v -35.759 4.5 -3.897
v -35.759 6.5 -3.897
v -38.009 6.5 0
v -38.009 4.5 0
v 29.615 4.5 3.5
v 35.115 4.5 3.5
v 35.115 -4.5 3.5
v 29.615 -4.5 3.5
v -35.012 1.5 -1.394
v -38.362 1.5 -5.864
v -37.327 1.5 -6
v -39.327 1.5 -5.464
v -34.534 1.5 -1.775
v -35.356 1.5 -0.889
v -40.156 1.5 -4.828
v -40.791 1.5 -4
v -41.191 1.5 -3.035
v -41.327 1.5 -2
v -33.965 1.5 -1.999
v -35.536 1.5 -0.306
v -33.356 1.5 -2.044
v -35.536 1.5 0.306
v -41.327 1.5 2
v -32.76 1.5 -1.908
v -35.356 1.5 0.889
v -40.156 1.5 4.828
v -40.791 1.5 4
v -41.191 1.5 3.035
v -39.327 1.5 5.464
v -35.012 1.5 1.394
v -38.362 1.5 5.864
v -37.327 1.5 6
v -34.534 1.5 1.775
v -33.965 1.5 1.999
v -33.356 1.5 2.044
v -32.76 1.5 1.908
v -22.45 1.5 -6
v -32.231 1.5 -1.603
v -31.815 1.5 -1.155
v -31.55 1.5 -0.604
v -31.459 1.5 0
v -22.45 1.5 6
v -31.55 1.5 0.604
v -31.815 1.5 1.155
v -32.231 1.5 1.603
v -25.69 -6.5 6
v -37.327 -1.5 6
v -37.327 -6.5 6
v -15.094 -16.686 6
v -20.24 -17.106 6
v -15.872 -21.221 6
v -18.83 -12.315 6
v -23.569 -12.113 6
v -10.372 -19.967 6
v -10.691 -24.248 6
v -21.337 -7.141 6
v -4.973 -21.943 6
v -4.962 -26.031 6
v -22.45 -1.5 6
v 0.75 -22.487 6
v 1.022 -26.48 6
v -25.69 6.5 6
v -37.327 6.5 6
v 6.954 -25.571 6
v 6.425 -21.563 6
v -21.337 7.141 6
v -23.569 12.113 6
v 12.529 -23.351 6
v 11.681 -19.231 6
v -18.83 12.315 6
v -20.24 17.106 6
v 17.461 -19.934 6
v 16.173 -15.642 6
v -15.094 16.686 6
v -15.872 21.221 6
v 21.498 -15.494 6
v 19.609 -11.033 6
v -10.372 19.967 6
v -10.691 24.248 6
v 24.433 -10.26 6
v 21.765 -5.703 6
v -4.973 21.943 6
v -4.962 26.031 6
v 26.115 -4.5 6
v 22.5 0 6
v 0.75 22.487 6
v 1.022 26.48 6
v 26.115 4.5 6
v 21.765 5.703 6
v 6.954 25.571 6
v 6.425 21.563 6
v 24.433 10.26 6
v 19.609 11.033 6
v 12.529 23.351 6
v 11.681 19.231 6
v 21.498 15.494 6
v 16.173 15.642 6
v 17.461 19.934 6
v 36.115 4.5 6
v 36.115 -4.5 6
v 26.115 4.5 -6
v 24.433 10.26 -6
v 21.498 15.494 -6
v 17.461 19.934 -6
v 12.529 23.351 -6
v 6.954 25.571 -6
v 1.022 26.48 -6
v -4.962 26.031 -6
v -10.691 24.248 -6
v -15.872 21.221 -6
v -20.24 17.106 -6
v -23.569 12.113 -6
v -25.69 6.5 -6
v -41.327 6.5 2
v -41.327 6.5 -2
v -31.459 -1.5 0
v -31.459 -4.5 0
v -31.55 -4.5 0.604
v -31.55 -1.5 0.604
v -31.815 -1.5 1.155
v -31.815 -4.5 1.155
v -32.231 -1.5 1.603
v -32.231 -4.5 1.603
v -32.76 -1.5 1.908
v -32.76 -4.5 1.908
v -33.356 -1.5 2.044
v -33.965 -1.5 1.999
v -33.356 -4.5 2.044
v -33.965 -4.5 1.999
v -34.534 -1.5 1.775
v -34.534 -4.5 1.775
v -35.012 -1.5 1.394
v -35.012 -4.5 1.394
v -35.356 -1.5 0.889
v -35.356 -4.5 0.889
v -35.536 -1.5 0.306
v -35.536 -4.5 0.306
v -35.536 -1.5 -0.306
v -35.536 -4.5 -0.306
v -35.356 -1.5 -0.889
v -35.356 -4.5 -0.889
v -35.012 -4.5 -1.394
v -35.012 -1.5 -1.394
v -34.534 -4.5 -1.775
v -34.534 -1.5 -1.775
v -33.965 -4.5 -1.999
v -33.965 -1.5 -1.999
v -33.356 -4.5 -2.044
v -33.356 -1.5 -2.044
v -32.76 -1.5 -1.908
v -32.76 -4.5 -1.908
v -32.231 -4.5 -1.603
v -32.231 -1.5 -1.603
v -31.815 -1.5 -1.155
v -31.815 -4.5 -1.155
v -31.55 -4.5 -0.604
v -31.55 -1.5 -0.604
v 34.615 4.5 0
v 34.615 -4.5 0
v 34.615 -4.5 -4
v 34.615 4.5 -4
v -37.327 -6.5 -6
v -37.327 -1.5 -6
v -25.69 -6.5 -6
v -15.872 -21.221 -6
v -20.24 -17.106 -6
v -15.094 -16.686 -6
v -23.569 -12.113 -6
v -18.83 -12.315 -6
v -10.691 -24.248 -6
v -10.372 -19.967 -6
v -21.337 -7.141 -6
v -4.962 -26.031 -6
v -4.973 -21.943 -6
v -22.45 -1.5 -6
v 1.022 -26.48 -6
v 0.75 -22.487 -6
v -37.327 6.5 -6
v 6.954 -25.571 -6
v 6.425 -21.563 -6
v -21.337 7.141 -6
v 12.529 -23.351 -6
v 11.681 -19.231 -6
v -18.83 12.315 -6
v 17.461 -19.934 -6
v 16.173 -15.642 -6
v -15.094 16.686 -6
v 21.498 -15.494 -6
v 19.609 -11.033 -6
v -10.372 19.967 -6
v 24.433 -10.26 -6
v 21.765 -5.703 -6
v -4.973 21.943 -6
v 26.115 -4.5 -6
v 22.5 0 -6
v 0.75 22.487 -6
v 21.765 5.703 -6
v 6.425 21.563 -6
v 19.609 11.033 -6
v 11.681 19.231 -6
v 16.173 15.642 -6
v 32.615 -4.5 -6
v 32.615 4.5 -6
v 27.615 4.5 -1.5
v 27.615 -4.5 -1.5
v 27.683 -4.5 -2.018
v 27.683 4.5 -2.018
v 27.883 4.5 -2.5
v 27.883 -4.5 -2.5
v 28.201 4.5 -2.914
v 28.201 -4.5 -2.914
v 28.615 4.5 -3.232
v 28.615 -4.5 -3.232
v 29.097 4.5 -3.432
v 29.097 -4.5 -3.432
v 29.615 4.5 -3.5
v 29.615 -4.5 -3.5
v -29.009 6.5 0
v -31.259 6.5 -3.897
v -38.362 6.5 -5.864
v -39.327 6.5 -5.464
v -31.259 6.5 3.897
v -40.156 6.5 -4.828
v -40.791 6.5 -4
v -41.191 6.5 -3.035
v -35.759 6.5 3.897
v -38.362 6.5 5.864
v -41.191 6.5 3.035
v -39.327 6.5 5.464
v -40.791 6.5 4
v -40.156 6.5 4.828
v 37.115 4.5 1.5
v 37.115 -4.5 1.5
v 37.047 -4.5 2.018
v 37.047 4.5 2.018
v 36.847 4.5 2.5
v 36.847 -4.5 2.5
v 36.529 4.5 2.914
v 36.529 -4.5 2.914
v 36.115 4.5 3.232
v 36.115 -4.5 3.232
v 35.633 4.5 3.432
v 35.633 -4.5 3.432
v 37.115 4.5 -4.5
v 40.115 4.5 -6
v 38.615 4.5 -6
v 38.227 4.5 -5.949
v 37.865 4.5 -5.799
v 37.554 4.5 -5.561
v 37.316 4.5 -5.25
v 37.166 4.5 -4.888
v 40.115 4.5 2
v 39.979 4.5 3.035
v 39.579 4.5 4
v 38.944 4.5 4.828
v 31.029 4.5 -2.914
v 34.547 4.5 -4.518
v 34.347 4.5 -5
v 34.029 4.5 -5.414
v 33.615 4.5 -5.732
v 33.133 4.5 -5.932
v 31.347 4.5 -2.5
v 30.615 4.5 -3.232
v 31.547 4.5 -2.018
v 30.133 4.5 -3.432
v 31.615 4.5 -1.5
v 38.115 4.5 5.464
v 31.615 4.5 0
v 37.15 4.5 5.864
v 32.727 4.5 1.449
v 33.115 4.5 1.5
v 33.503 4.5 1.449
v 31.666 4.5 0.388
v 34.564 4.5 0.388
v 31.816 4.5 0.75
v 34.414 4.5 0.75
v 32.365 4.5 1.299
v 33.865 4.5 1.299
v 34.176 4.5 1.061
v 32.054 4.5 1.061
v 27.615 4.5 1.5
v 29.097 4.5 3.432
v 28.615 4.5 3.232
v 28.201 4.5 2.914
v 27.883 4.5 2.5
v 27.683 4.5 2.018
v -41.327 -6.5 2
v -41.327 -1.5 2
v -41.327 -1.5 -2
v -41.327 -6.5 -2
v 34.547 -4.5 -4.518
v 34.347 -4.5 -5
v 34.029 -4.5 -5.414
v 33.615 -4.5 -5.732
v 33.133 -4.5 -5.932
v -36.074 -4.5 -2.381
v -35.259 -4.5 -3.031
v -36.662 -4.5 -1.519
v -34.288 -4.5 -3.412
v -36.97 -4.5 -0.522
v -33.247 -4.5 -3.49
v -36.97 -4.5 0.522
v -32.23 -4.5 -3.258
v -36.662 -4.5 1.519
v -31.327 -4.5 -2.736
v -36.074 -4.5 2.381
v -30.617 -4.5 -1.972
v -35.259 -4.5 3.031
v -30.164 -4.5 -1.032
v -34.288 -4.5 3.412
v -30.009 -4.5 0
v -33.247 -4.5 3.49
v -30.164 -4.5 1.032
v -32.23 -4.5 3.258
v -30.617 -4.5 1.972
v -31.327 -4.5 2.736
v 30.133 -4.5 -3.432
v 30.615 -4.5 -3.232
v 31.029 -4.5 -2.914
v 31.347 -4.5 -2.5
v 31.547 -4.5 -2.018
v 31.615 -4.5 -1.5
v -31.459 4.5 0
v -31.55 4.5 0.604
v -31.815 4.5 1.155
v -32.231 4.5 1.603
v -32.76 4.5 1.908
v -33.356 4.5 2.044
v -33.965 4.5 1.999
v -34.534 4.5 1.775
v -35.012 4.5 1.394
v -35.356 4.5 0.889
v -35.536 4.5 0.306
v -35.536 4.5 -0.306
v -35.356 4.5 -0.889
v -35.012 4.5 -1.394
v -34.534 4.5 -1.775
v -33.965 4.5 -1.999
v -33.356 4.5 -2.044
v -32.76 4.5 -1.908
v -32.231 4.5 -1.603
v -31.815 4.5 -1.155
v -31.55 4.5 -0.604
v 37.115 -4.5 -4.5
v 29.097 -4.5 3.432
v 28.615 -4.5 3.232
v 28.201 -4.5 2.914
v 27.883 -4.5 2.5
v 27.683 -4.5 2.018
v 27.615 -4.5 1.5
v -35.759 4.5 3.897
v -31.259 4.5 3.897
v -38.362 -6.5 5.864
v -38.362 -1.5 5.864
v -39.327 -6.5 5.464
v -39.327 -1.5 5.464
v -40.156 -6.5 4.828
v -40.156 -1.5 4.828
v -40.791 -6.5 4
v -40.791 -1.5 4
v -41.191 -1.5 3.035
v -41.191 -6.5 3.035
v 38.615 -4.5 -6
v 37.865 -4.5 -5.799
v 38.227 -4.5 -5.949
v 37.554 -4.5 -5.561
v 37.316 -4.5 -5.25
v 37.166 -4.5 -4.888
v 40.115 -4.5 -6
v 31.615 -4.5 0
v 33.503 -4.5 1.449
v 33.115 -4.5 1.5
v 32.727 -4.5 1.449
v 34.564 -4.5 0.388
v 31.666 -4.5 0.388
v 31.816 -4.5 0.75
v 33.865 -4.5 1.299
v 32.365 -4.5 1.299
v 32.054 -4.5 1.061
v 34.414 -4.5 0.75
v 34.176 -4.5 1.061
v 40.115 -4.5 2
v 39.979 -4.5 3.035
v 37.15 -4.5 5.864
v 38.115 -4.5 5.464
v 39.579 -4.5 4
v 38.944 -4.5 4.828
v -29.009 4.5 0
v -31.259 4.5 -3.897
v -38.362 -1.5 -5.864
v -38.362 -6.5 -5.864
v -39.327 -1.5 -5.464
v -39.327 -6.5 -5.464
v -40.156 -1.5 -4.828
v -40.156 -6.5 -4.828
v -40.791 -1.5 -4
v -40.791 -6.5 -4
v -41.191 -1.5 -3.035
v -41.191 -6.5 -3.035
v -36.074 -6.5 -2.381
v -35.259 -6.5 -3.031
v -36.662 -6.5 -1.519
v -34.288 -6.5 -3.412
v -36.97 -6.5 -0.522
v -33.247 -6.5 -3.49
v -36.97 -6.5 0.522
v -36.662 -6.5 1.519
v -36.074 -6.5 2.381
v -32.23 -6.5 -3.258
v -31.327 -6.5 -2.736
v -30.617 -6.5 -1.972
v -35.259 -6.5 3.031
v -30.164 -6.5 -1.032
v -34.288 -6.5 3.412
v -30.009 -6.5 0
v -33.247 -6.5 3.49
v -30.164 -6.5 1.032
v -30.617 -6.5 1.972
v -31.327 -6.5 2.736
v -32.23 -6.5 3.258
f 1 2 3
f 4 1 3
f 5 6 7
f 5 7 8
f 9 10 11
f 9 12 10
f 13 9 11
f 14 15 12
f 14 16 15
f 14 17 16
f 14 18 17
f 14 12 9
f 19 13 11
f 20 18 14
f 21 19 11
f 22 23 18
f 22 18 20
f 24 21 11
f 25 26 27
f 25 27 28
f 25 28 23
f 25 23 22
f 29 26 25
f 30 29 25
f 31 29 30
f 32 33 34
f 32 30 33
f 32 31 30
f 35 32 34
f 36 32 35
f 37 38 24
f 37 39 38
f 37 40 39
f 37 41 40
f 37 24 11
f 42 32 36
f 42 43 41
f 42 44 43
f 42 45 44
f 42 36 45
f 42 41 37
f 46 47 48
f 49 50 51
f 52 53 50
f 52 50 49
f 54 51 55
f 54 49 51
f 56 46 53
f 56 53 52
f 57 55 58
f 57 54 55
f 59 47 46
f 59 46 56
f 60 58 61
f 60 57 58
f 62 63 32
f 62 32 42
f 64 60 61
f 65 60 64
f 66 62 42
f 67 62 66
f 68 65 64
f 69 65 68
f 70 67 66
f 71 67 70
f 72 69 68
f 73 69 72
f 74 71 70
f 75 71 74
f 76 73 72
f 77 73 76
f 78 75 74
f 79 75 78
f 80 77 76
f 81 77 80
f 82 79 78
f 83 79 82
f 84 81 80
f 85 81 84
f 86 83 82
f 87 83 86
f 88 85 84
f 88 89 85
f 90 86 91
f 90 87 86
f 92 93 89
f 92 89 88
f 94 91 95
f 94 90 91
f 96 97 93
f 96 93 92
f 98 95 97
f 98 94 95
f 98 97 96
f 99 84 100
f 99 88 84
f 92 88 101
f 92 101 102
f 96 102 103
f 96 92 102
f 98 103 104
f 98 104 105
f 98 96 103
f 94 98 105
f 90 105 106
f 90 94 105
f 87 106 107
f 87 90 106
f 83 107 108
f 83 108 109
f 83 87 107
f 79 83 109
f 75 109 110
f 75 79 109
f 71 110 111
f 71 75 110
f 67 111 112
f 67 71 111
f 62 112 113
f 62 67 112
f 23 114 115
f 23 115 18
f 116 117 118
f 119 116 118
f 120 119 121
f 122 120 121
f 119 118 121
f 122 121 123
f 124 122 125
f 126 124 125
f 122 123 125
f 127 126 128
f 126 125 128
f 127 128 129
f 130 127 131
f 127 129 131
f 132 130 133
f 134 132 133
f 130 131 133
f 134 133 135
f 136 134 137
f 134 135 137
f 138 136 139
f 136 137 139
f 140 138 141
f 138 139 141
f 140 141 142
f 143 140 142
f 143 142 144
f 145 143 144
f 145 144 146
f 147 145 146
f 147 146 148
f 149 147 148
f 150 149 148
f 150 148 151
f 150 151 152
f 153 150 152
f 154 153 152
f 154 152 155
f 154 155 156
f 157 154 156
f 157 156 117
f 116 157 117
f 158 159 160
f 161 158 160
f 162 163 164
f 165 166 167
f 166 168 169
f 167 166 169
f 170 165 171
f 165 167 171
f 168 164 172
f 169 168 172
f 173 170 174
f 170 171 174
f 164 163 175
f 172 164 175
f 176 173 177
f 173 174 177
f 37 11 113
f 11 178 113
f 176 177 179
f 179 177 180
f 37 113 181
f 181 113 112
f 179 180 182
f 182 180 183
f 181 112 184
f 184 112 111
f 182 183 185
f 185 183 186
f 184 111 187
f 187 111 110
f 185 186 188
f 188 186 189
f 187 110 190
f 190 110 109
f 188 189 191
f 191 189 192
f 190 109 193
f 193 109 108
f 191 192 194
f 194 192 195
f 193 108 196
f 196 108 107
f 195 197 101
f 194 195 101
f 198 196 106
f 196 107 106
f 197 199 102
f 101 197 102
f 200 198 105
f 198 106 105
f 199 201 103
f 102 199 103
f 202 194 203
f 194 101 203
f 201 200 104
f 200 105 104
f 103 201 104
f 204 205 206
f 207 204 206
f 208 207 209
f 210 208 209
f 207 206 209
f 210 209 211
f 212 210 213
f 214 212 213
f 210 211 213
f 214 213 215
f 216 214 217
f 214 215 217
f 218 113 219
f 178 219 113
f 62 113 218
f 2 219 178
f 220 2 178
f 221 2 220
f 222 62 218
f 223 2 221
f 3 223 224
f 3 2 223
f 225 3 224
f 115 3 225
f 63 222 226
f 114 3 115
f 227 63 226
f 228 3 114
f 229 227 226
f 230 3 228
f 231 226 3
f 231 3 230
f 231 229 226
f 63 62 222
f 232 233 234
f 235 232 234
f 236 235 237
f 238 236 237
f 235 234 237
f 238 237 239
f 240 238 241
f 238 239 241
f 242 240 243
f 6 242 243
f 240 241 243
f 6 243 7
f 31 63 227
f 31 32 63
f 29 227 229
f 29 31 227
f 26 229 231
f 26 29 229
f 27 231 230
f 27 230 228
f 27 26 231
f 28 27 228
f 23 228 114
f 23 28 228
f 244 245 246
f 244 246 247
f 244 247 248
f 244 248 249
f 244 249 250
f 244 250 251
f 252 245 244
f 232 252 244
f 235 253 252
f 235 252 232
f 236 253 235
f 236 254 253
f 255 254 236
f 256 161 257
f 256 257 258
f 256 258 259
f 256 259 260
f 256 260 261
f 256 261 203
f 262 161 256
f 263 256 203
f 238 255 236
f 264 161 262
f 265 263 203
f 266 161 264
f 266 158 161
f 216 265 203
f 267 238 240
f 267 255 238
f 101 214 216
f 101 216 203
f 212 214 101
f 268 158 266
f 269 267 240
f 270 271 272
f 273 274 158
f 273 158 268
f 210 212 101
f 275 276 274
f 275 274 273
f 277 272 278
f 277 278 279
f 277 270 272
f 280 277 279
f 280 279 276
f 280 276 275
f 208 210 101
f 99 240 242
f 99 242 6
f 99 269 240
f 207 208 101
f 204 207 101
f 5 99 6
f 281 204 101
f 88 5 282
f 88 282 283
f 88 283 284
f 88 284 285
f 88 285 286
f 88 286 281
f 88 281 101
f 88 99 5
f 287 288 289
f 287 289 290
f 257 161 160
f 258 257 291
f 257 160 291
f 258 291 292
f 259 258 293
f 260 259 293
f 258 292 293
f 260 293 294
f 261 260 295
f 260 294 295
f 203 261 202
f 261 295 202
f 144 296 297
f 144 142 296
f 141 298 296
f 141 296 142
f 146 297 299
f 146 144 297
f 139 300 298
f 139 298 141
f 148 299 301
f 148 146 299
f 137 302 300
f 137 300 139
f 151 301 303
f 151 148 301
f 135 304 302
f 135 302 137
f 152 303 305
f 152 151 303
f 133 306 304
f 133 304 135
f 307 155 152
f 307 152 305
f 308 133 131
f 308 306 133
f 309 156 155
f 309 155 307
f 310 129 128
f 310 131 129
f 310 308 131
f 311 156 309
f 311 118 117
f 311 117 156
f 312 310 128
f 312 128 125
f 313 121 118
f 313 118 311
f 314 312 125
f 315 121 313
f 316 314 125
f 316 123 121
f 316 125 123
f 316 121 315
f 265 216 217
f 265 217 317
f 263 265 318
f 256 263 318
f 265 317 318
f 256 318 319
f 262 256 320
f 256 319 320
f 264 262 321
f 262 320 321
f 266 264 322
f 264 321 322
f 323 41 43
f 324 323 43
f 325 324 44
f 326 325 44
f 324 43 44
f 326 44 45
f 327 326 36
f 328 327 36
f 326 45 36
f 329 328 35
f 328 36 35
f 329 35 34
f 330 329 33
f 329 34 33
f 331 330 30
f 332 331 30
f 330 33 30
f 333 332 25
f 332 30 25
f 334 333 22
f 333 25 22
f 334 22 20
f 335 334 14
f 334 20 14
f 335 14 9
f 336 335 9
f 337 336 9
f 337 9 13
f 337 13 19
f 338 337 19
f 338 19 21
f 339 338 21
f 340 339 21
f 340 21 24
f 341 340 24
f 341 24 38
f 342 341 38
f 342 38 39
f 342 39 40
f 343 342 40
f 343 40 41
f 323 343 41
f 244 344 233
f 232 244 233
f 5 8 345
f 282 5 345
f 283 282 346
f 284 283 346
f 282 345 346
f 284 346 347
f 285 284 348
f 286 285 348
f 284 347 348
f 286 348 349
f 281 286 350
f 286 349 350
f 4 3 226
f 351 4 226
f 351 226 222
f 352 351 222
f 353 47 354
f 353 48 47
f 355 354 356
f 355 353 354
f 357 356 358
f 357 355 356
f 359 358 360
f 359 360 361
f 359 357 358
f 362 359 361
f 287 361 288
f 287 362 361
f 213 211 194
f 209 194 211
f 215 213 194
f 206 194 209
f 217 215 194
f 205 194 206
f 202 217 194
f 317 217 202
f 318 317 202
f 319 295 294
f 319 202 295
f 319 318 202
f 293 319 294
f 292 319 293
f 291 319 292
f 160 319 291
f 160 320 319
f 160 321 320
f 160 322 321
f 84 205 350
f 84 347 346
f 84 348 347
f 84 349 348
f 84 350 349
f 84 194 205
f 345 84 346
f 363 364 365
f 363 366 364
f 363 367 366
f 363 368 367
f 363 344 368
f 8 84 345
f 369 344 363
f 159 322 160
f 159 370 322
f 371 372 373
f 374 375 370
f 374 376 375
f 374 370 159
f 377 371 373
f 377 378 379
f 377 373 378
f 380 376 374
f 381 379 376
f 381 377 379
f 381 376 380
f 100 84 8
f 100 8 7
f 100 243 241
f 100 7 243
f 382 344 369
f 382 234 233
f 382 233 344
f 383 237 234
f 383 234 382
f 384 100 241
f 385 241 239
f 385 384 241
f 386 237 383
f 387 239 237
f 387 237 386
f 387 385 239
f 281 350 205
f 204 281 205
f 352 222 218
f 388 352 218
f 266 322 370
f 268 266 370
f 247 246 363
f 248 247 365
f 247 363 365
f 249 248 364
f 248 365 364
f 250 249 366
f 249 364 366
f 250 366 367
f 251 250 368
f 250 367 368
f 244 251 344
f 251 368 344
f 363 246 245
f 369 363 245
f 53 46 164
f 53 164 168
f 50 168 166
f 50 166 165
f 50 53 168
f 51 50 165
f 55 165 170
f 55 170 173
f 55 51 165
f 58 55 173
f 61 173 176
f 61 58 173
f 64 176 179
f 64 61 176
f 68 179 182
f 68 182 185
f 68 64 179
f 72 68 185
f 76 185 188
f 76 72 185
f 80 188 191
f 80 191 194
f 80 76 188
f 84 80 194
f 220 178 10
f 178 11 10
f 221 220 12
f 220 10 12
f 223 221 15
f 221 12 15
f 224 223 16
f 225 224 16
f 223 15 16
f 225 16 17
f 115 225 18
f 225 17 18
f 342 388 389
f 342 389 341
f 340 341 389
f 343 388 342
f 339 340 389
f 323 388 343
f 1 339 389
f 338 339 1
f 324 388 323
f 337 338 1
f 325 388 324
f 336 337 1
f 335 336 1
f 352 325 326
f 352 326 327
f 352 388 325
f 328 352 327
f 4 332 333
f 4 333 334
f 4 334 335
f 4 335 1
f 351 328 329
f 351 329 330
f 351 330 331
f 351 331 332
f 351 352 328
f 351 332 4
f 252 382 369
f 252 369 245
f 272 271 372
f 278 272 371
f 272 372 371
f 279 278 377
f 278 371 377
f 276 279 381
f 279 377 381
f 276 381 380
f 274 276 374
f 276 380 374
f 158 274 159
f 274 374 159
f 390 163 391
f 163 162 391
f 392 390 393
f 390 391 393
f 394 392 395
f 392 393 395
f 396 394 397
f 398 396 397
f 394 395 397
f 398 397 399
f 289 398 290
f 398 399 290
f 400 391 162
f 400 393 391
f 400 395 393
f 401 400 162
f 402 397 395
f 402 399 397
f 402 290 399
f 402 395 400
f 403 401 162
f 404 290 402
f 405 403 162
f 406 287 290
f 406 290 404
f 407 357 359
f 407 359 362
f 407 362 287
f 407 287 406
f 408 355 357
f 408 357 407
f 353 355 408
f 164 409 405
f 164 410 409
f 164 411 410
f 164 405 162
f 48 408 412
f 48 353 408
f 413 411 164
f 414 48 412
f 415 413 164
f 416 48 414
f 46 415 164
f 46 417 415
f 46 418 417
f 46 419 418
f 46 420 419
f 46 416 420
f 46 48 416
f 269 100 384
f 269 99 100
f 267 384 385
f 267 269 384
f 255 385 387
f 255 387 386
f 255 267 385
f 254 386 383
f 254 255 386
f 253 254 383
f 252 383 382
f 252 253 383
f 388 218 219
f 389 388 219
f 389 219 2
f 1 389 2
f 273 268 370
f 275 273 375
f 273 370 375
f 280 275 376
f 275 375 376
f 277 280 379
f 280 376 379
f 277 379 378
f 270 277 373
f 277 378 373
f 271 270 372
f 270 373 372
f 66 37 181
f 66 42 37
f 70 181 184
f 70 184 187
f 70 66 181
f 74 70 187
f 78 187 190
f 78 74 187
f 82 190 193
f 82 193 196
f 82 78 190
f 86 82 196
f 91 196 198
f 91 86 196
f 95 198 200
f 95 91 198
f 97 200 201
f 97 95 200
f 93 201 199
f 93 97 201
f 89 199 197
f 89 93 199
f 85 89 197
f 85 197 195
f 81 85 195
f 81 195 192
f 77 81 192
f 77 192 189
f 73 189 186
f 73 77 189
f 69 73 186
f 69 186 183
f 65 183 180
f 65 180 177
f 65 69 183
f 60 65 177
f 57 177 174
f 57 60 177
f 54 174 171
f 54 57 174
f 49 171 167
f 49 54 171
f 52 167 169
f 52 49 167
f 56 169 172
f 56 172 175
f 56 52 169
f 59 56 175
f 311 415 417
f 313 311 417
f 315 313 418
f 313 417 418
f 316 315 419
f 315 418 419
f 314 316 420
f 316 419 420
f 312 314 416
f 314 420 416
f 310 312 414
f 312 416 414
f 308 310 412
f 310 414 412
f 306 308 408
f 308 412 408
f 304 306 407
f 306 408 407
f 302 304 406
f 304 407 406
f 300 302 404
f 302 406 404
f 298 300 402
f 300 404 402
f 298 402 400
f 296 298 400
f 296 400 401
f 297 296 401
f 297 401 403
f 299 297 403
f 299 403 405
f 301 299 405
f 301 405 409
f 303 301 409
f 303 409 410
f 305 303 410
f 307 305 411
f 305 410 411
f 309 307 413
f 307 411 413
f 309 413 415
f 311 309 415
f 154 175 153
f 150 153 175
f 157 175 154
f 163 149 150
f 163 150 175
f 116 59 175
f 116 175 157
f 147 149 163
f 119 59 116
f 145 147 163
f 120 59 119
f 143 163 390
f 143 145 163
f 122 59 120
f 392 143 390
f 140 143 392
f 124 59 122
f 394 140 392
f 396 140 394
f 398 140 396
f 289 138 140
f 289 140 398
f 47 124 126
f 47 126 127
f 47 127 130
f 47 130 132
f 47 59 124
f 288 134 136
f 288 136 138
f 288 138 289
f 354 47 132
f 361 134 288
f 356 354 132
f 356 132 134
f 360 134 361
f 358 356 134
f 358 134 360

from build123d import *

# Parameters (mm, degrees)
F1_DEPTH = 6
F5_DEPTH = 9
F2_R     = 2.05
F6_DEPTH = 13
F2_R_2   = 3.5
F7_DEPTH = 2
F8_DEPTH = 2
F9_R     = 4


with BuildPart() as f1:
    # F0 (on Top) → F1 (new body, symmetric)
    with BuildSketch(Plane.XY):
        with BuildLine():
            ThreePointArc((-22.449944, 1.5), (22.5, 0), (-22.449944, -1.5))
            Line((-22.449944, -1.5), (-41.327112, -1.5))
            Line((-41.327112, -1.5), (-41.327112, -6.5))
            Line((-41.327112, -6.5), (-25.690465, -6.5))
            ThreePointArc((-25.690465, -6.5), (1.022294, -26.480274), (26.11513, -4.5))
            Line((26.11513, -4.5), (40.11513, -4.5))
            Line((40.11513, -4.5), (40.11513, 4.5))
            Line((40.11513, 4.5), (26.11513, 4.5))
            ThreePointArc((26.11513, 4.5), (1.022294, 26.480274), (-25.690465, 6.5))
            Line((-25.690465, 6.5), (-41.327112, 6.5))
            Line((-41.327112, 6.5), (-41.327112, 1.5))
            Line((-41.327112, 1.5), (-22.449944, 1.5))
        make_face()
    extrude(amount=F1_DEPTH, both=True)

    # F4 (on face) → F5 (cut, through all)
    with BuildSketch(Plane.XZ.offset(4.5)):
        with BuildLine():
            ThreePointArc((38.61513, -6), (37.55447, -5.56066), (37.11513, -4.5))
            Line((37.11513, -4.5), (37.11513, 1.5))
            ThreePointArc((37.11513, 1.5), (36.529343, 2.914214), (35.11513, 3.5))
            Line((35.11513, 3.5), (29.61513, 3.5))
            ThreePointArc((29.61513, 3.5), (28.200916, 2.914214), (27.61513, 1.5))
            Line((27.61513, 1.5), (27.61513, -1.5))
            ThreePointArc((27.61513, -1.5), (28.200916, -2.914214), (29.61513, -3.5))
            ThreePointArc((29.61513, -3.5), (31.029343, -2.914214), (31.61513, -1.5))
            Line((31.61513, -1.5), (31.61513, 0))
            ThreePointArc((31.61513, 0), (32.05447, 1.06066), (33.11513, 1.5))
            ThreePointArc((33.11513, 1.5), (34.17579, 1.06066), (34.61513, 0))
            Line((34.61513, 0), (34.61513, -4))
            ThreePointArc((34.61513, -4), (34.029343, -5.414214), (32.61513, -6))
            Line((32.61513, -6), (34.61513, -6))
            Line((34.61513, -6), (37.11513, -6))
            Line((37.11513, -6), (38.61513, -6))
        make_face()
    extrude(amount=-F5_DEPTH, mode=Mode.SUBTRACT)

    # F2 (on face) → F6 (cut, through all)
    with BuildSketch(Plane.XZ.offset(6.5)):
        with Locations((-33.508788, 0)):
            Circle(F2_R)
    extrude(amount=-F6_DEPTH, mode=Mode.SUBTRACT)

    # F2 (on face) → F7 (cut)
    with BuildSketch(Plane.XZ.offset(6.5)):
        with Locations((-33.508788, 0)):
            Circle(F2_R_2)
        with Locations((-33.508788, 0)):
            Circle(F2_R, mode=Mode.SUBTRACT)
    extrude(amount=-F7_DEPTH, mode=Mode.SUBTRACT)

    # F3 (on face) → F8 (cut)
    with BuildSketch(Plane(origin=(0, 6.5, 0), x_dir=(-1, 0, 0), z_dir=(0, 1, 0))):
        Polygon((31.258788, -3.897114), (35.758788, -3.897114), (38.008788, 0), (35.758788, 3.897114), (31.258788, 3.897114), (29.008788, 0), align=None)
    extrude(amount=-F8_DEPTH, mode=Mode.SUBTRACT)

    # F9
    f9_edges = [f1.edges().sort_by_distance(p)[0] for p in [
        (-41.327112, -4, 6),
        (-41.327112, 4, 6),
        (-41.327112, 4, -6),
        (-41.327112, -4, -6),
        (40.11513, 0, 6),
    ]]
    fillet(f9_edges, radius=F9_R)


solid = f1.part
